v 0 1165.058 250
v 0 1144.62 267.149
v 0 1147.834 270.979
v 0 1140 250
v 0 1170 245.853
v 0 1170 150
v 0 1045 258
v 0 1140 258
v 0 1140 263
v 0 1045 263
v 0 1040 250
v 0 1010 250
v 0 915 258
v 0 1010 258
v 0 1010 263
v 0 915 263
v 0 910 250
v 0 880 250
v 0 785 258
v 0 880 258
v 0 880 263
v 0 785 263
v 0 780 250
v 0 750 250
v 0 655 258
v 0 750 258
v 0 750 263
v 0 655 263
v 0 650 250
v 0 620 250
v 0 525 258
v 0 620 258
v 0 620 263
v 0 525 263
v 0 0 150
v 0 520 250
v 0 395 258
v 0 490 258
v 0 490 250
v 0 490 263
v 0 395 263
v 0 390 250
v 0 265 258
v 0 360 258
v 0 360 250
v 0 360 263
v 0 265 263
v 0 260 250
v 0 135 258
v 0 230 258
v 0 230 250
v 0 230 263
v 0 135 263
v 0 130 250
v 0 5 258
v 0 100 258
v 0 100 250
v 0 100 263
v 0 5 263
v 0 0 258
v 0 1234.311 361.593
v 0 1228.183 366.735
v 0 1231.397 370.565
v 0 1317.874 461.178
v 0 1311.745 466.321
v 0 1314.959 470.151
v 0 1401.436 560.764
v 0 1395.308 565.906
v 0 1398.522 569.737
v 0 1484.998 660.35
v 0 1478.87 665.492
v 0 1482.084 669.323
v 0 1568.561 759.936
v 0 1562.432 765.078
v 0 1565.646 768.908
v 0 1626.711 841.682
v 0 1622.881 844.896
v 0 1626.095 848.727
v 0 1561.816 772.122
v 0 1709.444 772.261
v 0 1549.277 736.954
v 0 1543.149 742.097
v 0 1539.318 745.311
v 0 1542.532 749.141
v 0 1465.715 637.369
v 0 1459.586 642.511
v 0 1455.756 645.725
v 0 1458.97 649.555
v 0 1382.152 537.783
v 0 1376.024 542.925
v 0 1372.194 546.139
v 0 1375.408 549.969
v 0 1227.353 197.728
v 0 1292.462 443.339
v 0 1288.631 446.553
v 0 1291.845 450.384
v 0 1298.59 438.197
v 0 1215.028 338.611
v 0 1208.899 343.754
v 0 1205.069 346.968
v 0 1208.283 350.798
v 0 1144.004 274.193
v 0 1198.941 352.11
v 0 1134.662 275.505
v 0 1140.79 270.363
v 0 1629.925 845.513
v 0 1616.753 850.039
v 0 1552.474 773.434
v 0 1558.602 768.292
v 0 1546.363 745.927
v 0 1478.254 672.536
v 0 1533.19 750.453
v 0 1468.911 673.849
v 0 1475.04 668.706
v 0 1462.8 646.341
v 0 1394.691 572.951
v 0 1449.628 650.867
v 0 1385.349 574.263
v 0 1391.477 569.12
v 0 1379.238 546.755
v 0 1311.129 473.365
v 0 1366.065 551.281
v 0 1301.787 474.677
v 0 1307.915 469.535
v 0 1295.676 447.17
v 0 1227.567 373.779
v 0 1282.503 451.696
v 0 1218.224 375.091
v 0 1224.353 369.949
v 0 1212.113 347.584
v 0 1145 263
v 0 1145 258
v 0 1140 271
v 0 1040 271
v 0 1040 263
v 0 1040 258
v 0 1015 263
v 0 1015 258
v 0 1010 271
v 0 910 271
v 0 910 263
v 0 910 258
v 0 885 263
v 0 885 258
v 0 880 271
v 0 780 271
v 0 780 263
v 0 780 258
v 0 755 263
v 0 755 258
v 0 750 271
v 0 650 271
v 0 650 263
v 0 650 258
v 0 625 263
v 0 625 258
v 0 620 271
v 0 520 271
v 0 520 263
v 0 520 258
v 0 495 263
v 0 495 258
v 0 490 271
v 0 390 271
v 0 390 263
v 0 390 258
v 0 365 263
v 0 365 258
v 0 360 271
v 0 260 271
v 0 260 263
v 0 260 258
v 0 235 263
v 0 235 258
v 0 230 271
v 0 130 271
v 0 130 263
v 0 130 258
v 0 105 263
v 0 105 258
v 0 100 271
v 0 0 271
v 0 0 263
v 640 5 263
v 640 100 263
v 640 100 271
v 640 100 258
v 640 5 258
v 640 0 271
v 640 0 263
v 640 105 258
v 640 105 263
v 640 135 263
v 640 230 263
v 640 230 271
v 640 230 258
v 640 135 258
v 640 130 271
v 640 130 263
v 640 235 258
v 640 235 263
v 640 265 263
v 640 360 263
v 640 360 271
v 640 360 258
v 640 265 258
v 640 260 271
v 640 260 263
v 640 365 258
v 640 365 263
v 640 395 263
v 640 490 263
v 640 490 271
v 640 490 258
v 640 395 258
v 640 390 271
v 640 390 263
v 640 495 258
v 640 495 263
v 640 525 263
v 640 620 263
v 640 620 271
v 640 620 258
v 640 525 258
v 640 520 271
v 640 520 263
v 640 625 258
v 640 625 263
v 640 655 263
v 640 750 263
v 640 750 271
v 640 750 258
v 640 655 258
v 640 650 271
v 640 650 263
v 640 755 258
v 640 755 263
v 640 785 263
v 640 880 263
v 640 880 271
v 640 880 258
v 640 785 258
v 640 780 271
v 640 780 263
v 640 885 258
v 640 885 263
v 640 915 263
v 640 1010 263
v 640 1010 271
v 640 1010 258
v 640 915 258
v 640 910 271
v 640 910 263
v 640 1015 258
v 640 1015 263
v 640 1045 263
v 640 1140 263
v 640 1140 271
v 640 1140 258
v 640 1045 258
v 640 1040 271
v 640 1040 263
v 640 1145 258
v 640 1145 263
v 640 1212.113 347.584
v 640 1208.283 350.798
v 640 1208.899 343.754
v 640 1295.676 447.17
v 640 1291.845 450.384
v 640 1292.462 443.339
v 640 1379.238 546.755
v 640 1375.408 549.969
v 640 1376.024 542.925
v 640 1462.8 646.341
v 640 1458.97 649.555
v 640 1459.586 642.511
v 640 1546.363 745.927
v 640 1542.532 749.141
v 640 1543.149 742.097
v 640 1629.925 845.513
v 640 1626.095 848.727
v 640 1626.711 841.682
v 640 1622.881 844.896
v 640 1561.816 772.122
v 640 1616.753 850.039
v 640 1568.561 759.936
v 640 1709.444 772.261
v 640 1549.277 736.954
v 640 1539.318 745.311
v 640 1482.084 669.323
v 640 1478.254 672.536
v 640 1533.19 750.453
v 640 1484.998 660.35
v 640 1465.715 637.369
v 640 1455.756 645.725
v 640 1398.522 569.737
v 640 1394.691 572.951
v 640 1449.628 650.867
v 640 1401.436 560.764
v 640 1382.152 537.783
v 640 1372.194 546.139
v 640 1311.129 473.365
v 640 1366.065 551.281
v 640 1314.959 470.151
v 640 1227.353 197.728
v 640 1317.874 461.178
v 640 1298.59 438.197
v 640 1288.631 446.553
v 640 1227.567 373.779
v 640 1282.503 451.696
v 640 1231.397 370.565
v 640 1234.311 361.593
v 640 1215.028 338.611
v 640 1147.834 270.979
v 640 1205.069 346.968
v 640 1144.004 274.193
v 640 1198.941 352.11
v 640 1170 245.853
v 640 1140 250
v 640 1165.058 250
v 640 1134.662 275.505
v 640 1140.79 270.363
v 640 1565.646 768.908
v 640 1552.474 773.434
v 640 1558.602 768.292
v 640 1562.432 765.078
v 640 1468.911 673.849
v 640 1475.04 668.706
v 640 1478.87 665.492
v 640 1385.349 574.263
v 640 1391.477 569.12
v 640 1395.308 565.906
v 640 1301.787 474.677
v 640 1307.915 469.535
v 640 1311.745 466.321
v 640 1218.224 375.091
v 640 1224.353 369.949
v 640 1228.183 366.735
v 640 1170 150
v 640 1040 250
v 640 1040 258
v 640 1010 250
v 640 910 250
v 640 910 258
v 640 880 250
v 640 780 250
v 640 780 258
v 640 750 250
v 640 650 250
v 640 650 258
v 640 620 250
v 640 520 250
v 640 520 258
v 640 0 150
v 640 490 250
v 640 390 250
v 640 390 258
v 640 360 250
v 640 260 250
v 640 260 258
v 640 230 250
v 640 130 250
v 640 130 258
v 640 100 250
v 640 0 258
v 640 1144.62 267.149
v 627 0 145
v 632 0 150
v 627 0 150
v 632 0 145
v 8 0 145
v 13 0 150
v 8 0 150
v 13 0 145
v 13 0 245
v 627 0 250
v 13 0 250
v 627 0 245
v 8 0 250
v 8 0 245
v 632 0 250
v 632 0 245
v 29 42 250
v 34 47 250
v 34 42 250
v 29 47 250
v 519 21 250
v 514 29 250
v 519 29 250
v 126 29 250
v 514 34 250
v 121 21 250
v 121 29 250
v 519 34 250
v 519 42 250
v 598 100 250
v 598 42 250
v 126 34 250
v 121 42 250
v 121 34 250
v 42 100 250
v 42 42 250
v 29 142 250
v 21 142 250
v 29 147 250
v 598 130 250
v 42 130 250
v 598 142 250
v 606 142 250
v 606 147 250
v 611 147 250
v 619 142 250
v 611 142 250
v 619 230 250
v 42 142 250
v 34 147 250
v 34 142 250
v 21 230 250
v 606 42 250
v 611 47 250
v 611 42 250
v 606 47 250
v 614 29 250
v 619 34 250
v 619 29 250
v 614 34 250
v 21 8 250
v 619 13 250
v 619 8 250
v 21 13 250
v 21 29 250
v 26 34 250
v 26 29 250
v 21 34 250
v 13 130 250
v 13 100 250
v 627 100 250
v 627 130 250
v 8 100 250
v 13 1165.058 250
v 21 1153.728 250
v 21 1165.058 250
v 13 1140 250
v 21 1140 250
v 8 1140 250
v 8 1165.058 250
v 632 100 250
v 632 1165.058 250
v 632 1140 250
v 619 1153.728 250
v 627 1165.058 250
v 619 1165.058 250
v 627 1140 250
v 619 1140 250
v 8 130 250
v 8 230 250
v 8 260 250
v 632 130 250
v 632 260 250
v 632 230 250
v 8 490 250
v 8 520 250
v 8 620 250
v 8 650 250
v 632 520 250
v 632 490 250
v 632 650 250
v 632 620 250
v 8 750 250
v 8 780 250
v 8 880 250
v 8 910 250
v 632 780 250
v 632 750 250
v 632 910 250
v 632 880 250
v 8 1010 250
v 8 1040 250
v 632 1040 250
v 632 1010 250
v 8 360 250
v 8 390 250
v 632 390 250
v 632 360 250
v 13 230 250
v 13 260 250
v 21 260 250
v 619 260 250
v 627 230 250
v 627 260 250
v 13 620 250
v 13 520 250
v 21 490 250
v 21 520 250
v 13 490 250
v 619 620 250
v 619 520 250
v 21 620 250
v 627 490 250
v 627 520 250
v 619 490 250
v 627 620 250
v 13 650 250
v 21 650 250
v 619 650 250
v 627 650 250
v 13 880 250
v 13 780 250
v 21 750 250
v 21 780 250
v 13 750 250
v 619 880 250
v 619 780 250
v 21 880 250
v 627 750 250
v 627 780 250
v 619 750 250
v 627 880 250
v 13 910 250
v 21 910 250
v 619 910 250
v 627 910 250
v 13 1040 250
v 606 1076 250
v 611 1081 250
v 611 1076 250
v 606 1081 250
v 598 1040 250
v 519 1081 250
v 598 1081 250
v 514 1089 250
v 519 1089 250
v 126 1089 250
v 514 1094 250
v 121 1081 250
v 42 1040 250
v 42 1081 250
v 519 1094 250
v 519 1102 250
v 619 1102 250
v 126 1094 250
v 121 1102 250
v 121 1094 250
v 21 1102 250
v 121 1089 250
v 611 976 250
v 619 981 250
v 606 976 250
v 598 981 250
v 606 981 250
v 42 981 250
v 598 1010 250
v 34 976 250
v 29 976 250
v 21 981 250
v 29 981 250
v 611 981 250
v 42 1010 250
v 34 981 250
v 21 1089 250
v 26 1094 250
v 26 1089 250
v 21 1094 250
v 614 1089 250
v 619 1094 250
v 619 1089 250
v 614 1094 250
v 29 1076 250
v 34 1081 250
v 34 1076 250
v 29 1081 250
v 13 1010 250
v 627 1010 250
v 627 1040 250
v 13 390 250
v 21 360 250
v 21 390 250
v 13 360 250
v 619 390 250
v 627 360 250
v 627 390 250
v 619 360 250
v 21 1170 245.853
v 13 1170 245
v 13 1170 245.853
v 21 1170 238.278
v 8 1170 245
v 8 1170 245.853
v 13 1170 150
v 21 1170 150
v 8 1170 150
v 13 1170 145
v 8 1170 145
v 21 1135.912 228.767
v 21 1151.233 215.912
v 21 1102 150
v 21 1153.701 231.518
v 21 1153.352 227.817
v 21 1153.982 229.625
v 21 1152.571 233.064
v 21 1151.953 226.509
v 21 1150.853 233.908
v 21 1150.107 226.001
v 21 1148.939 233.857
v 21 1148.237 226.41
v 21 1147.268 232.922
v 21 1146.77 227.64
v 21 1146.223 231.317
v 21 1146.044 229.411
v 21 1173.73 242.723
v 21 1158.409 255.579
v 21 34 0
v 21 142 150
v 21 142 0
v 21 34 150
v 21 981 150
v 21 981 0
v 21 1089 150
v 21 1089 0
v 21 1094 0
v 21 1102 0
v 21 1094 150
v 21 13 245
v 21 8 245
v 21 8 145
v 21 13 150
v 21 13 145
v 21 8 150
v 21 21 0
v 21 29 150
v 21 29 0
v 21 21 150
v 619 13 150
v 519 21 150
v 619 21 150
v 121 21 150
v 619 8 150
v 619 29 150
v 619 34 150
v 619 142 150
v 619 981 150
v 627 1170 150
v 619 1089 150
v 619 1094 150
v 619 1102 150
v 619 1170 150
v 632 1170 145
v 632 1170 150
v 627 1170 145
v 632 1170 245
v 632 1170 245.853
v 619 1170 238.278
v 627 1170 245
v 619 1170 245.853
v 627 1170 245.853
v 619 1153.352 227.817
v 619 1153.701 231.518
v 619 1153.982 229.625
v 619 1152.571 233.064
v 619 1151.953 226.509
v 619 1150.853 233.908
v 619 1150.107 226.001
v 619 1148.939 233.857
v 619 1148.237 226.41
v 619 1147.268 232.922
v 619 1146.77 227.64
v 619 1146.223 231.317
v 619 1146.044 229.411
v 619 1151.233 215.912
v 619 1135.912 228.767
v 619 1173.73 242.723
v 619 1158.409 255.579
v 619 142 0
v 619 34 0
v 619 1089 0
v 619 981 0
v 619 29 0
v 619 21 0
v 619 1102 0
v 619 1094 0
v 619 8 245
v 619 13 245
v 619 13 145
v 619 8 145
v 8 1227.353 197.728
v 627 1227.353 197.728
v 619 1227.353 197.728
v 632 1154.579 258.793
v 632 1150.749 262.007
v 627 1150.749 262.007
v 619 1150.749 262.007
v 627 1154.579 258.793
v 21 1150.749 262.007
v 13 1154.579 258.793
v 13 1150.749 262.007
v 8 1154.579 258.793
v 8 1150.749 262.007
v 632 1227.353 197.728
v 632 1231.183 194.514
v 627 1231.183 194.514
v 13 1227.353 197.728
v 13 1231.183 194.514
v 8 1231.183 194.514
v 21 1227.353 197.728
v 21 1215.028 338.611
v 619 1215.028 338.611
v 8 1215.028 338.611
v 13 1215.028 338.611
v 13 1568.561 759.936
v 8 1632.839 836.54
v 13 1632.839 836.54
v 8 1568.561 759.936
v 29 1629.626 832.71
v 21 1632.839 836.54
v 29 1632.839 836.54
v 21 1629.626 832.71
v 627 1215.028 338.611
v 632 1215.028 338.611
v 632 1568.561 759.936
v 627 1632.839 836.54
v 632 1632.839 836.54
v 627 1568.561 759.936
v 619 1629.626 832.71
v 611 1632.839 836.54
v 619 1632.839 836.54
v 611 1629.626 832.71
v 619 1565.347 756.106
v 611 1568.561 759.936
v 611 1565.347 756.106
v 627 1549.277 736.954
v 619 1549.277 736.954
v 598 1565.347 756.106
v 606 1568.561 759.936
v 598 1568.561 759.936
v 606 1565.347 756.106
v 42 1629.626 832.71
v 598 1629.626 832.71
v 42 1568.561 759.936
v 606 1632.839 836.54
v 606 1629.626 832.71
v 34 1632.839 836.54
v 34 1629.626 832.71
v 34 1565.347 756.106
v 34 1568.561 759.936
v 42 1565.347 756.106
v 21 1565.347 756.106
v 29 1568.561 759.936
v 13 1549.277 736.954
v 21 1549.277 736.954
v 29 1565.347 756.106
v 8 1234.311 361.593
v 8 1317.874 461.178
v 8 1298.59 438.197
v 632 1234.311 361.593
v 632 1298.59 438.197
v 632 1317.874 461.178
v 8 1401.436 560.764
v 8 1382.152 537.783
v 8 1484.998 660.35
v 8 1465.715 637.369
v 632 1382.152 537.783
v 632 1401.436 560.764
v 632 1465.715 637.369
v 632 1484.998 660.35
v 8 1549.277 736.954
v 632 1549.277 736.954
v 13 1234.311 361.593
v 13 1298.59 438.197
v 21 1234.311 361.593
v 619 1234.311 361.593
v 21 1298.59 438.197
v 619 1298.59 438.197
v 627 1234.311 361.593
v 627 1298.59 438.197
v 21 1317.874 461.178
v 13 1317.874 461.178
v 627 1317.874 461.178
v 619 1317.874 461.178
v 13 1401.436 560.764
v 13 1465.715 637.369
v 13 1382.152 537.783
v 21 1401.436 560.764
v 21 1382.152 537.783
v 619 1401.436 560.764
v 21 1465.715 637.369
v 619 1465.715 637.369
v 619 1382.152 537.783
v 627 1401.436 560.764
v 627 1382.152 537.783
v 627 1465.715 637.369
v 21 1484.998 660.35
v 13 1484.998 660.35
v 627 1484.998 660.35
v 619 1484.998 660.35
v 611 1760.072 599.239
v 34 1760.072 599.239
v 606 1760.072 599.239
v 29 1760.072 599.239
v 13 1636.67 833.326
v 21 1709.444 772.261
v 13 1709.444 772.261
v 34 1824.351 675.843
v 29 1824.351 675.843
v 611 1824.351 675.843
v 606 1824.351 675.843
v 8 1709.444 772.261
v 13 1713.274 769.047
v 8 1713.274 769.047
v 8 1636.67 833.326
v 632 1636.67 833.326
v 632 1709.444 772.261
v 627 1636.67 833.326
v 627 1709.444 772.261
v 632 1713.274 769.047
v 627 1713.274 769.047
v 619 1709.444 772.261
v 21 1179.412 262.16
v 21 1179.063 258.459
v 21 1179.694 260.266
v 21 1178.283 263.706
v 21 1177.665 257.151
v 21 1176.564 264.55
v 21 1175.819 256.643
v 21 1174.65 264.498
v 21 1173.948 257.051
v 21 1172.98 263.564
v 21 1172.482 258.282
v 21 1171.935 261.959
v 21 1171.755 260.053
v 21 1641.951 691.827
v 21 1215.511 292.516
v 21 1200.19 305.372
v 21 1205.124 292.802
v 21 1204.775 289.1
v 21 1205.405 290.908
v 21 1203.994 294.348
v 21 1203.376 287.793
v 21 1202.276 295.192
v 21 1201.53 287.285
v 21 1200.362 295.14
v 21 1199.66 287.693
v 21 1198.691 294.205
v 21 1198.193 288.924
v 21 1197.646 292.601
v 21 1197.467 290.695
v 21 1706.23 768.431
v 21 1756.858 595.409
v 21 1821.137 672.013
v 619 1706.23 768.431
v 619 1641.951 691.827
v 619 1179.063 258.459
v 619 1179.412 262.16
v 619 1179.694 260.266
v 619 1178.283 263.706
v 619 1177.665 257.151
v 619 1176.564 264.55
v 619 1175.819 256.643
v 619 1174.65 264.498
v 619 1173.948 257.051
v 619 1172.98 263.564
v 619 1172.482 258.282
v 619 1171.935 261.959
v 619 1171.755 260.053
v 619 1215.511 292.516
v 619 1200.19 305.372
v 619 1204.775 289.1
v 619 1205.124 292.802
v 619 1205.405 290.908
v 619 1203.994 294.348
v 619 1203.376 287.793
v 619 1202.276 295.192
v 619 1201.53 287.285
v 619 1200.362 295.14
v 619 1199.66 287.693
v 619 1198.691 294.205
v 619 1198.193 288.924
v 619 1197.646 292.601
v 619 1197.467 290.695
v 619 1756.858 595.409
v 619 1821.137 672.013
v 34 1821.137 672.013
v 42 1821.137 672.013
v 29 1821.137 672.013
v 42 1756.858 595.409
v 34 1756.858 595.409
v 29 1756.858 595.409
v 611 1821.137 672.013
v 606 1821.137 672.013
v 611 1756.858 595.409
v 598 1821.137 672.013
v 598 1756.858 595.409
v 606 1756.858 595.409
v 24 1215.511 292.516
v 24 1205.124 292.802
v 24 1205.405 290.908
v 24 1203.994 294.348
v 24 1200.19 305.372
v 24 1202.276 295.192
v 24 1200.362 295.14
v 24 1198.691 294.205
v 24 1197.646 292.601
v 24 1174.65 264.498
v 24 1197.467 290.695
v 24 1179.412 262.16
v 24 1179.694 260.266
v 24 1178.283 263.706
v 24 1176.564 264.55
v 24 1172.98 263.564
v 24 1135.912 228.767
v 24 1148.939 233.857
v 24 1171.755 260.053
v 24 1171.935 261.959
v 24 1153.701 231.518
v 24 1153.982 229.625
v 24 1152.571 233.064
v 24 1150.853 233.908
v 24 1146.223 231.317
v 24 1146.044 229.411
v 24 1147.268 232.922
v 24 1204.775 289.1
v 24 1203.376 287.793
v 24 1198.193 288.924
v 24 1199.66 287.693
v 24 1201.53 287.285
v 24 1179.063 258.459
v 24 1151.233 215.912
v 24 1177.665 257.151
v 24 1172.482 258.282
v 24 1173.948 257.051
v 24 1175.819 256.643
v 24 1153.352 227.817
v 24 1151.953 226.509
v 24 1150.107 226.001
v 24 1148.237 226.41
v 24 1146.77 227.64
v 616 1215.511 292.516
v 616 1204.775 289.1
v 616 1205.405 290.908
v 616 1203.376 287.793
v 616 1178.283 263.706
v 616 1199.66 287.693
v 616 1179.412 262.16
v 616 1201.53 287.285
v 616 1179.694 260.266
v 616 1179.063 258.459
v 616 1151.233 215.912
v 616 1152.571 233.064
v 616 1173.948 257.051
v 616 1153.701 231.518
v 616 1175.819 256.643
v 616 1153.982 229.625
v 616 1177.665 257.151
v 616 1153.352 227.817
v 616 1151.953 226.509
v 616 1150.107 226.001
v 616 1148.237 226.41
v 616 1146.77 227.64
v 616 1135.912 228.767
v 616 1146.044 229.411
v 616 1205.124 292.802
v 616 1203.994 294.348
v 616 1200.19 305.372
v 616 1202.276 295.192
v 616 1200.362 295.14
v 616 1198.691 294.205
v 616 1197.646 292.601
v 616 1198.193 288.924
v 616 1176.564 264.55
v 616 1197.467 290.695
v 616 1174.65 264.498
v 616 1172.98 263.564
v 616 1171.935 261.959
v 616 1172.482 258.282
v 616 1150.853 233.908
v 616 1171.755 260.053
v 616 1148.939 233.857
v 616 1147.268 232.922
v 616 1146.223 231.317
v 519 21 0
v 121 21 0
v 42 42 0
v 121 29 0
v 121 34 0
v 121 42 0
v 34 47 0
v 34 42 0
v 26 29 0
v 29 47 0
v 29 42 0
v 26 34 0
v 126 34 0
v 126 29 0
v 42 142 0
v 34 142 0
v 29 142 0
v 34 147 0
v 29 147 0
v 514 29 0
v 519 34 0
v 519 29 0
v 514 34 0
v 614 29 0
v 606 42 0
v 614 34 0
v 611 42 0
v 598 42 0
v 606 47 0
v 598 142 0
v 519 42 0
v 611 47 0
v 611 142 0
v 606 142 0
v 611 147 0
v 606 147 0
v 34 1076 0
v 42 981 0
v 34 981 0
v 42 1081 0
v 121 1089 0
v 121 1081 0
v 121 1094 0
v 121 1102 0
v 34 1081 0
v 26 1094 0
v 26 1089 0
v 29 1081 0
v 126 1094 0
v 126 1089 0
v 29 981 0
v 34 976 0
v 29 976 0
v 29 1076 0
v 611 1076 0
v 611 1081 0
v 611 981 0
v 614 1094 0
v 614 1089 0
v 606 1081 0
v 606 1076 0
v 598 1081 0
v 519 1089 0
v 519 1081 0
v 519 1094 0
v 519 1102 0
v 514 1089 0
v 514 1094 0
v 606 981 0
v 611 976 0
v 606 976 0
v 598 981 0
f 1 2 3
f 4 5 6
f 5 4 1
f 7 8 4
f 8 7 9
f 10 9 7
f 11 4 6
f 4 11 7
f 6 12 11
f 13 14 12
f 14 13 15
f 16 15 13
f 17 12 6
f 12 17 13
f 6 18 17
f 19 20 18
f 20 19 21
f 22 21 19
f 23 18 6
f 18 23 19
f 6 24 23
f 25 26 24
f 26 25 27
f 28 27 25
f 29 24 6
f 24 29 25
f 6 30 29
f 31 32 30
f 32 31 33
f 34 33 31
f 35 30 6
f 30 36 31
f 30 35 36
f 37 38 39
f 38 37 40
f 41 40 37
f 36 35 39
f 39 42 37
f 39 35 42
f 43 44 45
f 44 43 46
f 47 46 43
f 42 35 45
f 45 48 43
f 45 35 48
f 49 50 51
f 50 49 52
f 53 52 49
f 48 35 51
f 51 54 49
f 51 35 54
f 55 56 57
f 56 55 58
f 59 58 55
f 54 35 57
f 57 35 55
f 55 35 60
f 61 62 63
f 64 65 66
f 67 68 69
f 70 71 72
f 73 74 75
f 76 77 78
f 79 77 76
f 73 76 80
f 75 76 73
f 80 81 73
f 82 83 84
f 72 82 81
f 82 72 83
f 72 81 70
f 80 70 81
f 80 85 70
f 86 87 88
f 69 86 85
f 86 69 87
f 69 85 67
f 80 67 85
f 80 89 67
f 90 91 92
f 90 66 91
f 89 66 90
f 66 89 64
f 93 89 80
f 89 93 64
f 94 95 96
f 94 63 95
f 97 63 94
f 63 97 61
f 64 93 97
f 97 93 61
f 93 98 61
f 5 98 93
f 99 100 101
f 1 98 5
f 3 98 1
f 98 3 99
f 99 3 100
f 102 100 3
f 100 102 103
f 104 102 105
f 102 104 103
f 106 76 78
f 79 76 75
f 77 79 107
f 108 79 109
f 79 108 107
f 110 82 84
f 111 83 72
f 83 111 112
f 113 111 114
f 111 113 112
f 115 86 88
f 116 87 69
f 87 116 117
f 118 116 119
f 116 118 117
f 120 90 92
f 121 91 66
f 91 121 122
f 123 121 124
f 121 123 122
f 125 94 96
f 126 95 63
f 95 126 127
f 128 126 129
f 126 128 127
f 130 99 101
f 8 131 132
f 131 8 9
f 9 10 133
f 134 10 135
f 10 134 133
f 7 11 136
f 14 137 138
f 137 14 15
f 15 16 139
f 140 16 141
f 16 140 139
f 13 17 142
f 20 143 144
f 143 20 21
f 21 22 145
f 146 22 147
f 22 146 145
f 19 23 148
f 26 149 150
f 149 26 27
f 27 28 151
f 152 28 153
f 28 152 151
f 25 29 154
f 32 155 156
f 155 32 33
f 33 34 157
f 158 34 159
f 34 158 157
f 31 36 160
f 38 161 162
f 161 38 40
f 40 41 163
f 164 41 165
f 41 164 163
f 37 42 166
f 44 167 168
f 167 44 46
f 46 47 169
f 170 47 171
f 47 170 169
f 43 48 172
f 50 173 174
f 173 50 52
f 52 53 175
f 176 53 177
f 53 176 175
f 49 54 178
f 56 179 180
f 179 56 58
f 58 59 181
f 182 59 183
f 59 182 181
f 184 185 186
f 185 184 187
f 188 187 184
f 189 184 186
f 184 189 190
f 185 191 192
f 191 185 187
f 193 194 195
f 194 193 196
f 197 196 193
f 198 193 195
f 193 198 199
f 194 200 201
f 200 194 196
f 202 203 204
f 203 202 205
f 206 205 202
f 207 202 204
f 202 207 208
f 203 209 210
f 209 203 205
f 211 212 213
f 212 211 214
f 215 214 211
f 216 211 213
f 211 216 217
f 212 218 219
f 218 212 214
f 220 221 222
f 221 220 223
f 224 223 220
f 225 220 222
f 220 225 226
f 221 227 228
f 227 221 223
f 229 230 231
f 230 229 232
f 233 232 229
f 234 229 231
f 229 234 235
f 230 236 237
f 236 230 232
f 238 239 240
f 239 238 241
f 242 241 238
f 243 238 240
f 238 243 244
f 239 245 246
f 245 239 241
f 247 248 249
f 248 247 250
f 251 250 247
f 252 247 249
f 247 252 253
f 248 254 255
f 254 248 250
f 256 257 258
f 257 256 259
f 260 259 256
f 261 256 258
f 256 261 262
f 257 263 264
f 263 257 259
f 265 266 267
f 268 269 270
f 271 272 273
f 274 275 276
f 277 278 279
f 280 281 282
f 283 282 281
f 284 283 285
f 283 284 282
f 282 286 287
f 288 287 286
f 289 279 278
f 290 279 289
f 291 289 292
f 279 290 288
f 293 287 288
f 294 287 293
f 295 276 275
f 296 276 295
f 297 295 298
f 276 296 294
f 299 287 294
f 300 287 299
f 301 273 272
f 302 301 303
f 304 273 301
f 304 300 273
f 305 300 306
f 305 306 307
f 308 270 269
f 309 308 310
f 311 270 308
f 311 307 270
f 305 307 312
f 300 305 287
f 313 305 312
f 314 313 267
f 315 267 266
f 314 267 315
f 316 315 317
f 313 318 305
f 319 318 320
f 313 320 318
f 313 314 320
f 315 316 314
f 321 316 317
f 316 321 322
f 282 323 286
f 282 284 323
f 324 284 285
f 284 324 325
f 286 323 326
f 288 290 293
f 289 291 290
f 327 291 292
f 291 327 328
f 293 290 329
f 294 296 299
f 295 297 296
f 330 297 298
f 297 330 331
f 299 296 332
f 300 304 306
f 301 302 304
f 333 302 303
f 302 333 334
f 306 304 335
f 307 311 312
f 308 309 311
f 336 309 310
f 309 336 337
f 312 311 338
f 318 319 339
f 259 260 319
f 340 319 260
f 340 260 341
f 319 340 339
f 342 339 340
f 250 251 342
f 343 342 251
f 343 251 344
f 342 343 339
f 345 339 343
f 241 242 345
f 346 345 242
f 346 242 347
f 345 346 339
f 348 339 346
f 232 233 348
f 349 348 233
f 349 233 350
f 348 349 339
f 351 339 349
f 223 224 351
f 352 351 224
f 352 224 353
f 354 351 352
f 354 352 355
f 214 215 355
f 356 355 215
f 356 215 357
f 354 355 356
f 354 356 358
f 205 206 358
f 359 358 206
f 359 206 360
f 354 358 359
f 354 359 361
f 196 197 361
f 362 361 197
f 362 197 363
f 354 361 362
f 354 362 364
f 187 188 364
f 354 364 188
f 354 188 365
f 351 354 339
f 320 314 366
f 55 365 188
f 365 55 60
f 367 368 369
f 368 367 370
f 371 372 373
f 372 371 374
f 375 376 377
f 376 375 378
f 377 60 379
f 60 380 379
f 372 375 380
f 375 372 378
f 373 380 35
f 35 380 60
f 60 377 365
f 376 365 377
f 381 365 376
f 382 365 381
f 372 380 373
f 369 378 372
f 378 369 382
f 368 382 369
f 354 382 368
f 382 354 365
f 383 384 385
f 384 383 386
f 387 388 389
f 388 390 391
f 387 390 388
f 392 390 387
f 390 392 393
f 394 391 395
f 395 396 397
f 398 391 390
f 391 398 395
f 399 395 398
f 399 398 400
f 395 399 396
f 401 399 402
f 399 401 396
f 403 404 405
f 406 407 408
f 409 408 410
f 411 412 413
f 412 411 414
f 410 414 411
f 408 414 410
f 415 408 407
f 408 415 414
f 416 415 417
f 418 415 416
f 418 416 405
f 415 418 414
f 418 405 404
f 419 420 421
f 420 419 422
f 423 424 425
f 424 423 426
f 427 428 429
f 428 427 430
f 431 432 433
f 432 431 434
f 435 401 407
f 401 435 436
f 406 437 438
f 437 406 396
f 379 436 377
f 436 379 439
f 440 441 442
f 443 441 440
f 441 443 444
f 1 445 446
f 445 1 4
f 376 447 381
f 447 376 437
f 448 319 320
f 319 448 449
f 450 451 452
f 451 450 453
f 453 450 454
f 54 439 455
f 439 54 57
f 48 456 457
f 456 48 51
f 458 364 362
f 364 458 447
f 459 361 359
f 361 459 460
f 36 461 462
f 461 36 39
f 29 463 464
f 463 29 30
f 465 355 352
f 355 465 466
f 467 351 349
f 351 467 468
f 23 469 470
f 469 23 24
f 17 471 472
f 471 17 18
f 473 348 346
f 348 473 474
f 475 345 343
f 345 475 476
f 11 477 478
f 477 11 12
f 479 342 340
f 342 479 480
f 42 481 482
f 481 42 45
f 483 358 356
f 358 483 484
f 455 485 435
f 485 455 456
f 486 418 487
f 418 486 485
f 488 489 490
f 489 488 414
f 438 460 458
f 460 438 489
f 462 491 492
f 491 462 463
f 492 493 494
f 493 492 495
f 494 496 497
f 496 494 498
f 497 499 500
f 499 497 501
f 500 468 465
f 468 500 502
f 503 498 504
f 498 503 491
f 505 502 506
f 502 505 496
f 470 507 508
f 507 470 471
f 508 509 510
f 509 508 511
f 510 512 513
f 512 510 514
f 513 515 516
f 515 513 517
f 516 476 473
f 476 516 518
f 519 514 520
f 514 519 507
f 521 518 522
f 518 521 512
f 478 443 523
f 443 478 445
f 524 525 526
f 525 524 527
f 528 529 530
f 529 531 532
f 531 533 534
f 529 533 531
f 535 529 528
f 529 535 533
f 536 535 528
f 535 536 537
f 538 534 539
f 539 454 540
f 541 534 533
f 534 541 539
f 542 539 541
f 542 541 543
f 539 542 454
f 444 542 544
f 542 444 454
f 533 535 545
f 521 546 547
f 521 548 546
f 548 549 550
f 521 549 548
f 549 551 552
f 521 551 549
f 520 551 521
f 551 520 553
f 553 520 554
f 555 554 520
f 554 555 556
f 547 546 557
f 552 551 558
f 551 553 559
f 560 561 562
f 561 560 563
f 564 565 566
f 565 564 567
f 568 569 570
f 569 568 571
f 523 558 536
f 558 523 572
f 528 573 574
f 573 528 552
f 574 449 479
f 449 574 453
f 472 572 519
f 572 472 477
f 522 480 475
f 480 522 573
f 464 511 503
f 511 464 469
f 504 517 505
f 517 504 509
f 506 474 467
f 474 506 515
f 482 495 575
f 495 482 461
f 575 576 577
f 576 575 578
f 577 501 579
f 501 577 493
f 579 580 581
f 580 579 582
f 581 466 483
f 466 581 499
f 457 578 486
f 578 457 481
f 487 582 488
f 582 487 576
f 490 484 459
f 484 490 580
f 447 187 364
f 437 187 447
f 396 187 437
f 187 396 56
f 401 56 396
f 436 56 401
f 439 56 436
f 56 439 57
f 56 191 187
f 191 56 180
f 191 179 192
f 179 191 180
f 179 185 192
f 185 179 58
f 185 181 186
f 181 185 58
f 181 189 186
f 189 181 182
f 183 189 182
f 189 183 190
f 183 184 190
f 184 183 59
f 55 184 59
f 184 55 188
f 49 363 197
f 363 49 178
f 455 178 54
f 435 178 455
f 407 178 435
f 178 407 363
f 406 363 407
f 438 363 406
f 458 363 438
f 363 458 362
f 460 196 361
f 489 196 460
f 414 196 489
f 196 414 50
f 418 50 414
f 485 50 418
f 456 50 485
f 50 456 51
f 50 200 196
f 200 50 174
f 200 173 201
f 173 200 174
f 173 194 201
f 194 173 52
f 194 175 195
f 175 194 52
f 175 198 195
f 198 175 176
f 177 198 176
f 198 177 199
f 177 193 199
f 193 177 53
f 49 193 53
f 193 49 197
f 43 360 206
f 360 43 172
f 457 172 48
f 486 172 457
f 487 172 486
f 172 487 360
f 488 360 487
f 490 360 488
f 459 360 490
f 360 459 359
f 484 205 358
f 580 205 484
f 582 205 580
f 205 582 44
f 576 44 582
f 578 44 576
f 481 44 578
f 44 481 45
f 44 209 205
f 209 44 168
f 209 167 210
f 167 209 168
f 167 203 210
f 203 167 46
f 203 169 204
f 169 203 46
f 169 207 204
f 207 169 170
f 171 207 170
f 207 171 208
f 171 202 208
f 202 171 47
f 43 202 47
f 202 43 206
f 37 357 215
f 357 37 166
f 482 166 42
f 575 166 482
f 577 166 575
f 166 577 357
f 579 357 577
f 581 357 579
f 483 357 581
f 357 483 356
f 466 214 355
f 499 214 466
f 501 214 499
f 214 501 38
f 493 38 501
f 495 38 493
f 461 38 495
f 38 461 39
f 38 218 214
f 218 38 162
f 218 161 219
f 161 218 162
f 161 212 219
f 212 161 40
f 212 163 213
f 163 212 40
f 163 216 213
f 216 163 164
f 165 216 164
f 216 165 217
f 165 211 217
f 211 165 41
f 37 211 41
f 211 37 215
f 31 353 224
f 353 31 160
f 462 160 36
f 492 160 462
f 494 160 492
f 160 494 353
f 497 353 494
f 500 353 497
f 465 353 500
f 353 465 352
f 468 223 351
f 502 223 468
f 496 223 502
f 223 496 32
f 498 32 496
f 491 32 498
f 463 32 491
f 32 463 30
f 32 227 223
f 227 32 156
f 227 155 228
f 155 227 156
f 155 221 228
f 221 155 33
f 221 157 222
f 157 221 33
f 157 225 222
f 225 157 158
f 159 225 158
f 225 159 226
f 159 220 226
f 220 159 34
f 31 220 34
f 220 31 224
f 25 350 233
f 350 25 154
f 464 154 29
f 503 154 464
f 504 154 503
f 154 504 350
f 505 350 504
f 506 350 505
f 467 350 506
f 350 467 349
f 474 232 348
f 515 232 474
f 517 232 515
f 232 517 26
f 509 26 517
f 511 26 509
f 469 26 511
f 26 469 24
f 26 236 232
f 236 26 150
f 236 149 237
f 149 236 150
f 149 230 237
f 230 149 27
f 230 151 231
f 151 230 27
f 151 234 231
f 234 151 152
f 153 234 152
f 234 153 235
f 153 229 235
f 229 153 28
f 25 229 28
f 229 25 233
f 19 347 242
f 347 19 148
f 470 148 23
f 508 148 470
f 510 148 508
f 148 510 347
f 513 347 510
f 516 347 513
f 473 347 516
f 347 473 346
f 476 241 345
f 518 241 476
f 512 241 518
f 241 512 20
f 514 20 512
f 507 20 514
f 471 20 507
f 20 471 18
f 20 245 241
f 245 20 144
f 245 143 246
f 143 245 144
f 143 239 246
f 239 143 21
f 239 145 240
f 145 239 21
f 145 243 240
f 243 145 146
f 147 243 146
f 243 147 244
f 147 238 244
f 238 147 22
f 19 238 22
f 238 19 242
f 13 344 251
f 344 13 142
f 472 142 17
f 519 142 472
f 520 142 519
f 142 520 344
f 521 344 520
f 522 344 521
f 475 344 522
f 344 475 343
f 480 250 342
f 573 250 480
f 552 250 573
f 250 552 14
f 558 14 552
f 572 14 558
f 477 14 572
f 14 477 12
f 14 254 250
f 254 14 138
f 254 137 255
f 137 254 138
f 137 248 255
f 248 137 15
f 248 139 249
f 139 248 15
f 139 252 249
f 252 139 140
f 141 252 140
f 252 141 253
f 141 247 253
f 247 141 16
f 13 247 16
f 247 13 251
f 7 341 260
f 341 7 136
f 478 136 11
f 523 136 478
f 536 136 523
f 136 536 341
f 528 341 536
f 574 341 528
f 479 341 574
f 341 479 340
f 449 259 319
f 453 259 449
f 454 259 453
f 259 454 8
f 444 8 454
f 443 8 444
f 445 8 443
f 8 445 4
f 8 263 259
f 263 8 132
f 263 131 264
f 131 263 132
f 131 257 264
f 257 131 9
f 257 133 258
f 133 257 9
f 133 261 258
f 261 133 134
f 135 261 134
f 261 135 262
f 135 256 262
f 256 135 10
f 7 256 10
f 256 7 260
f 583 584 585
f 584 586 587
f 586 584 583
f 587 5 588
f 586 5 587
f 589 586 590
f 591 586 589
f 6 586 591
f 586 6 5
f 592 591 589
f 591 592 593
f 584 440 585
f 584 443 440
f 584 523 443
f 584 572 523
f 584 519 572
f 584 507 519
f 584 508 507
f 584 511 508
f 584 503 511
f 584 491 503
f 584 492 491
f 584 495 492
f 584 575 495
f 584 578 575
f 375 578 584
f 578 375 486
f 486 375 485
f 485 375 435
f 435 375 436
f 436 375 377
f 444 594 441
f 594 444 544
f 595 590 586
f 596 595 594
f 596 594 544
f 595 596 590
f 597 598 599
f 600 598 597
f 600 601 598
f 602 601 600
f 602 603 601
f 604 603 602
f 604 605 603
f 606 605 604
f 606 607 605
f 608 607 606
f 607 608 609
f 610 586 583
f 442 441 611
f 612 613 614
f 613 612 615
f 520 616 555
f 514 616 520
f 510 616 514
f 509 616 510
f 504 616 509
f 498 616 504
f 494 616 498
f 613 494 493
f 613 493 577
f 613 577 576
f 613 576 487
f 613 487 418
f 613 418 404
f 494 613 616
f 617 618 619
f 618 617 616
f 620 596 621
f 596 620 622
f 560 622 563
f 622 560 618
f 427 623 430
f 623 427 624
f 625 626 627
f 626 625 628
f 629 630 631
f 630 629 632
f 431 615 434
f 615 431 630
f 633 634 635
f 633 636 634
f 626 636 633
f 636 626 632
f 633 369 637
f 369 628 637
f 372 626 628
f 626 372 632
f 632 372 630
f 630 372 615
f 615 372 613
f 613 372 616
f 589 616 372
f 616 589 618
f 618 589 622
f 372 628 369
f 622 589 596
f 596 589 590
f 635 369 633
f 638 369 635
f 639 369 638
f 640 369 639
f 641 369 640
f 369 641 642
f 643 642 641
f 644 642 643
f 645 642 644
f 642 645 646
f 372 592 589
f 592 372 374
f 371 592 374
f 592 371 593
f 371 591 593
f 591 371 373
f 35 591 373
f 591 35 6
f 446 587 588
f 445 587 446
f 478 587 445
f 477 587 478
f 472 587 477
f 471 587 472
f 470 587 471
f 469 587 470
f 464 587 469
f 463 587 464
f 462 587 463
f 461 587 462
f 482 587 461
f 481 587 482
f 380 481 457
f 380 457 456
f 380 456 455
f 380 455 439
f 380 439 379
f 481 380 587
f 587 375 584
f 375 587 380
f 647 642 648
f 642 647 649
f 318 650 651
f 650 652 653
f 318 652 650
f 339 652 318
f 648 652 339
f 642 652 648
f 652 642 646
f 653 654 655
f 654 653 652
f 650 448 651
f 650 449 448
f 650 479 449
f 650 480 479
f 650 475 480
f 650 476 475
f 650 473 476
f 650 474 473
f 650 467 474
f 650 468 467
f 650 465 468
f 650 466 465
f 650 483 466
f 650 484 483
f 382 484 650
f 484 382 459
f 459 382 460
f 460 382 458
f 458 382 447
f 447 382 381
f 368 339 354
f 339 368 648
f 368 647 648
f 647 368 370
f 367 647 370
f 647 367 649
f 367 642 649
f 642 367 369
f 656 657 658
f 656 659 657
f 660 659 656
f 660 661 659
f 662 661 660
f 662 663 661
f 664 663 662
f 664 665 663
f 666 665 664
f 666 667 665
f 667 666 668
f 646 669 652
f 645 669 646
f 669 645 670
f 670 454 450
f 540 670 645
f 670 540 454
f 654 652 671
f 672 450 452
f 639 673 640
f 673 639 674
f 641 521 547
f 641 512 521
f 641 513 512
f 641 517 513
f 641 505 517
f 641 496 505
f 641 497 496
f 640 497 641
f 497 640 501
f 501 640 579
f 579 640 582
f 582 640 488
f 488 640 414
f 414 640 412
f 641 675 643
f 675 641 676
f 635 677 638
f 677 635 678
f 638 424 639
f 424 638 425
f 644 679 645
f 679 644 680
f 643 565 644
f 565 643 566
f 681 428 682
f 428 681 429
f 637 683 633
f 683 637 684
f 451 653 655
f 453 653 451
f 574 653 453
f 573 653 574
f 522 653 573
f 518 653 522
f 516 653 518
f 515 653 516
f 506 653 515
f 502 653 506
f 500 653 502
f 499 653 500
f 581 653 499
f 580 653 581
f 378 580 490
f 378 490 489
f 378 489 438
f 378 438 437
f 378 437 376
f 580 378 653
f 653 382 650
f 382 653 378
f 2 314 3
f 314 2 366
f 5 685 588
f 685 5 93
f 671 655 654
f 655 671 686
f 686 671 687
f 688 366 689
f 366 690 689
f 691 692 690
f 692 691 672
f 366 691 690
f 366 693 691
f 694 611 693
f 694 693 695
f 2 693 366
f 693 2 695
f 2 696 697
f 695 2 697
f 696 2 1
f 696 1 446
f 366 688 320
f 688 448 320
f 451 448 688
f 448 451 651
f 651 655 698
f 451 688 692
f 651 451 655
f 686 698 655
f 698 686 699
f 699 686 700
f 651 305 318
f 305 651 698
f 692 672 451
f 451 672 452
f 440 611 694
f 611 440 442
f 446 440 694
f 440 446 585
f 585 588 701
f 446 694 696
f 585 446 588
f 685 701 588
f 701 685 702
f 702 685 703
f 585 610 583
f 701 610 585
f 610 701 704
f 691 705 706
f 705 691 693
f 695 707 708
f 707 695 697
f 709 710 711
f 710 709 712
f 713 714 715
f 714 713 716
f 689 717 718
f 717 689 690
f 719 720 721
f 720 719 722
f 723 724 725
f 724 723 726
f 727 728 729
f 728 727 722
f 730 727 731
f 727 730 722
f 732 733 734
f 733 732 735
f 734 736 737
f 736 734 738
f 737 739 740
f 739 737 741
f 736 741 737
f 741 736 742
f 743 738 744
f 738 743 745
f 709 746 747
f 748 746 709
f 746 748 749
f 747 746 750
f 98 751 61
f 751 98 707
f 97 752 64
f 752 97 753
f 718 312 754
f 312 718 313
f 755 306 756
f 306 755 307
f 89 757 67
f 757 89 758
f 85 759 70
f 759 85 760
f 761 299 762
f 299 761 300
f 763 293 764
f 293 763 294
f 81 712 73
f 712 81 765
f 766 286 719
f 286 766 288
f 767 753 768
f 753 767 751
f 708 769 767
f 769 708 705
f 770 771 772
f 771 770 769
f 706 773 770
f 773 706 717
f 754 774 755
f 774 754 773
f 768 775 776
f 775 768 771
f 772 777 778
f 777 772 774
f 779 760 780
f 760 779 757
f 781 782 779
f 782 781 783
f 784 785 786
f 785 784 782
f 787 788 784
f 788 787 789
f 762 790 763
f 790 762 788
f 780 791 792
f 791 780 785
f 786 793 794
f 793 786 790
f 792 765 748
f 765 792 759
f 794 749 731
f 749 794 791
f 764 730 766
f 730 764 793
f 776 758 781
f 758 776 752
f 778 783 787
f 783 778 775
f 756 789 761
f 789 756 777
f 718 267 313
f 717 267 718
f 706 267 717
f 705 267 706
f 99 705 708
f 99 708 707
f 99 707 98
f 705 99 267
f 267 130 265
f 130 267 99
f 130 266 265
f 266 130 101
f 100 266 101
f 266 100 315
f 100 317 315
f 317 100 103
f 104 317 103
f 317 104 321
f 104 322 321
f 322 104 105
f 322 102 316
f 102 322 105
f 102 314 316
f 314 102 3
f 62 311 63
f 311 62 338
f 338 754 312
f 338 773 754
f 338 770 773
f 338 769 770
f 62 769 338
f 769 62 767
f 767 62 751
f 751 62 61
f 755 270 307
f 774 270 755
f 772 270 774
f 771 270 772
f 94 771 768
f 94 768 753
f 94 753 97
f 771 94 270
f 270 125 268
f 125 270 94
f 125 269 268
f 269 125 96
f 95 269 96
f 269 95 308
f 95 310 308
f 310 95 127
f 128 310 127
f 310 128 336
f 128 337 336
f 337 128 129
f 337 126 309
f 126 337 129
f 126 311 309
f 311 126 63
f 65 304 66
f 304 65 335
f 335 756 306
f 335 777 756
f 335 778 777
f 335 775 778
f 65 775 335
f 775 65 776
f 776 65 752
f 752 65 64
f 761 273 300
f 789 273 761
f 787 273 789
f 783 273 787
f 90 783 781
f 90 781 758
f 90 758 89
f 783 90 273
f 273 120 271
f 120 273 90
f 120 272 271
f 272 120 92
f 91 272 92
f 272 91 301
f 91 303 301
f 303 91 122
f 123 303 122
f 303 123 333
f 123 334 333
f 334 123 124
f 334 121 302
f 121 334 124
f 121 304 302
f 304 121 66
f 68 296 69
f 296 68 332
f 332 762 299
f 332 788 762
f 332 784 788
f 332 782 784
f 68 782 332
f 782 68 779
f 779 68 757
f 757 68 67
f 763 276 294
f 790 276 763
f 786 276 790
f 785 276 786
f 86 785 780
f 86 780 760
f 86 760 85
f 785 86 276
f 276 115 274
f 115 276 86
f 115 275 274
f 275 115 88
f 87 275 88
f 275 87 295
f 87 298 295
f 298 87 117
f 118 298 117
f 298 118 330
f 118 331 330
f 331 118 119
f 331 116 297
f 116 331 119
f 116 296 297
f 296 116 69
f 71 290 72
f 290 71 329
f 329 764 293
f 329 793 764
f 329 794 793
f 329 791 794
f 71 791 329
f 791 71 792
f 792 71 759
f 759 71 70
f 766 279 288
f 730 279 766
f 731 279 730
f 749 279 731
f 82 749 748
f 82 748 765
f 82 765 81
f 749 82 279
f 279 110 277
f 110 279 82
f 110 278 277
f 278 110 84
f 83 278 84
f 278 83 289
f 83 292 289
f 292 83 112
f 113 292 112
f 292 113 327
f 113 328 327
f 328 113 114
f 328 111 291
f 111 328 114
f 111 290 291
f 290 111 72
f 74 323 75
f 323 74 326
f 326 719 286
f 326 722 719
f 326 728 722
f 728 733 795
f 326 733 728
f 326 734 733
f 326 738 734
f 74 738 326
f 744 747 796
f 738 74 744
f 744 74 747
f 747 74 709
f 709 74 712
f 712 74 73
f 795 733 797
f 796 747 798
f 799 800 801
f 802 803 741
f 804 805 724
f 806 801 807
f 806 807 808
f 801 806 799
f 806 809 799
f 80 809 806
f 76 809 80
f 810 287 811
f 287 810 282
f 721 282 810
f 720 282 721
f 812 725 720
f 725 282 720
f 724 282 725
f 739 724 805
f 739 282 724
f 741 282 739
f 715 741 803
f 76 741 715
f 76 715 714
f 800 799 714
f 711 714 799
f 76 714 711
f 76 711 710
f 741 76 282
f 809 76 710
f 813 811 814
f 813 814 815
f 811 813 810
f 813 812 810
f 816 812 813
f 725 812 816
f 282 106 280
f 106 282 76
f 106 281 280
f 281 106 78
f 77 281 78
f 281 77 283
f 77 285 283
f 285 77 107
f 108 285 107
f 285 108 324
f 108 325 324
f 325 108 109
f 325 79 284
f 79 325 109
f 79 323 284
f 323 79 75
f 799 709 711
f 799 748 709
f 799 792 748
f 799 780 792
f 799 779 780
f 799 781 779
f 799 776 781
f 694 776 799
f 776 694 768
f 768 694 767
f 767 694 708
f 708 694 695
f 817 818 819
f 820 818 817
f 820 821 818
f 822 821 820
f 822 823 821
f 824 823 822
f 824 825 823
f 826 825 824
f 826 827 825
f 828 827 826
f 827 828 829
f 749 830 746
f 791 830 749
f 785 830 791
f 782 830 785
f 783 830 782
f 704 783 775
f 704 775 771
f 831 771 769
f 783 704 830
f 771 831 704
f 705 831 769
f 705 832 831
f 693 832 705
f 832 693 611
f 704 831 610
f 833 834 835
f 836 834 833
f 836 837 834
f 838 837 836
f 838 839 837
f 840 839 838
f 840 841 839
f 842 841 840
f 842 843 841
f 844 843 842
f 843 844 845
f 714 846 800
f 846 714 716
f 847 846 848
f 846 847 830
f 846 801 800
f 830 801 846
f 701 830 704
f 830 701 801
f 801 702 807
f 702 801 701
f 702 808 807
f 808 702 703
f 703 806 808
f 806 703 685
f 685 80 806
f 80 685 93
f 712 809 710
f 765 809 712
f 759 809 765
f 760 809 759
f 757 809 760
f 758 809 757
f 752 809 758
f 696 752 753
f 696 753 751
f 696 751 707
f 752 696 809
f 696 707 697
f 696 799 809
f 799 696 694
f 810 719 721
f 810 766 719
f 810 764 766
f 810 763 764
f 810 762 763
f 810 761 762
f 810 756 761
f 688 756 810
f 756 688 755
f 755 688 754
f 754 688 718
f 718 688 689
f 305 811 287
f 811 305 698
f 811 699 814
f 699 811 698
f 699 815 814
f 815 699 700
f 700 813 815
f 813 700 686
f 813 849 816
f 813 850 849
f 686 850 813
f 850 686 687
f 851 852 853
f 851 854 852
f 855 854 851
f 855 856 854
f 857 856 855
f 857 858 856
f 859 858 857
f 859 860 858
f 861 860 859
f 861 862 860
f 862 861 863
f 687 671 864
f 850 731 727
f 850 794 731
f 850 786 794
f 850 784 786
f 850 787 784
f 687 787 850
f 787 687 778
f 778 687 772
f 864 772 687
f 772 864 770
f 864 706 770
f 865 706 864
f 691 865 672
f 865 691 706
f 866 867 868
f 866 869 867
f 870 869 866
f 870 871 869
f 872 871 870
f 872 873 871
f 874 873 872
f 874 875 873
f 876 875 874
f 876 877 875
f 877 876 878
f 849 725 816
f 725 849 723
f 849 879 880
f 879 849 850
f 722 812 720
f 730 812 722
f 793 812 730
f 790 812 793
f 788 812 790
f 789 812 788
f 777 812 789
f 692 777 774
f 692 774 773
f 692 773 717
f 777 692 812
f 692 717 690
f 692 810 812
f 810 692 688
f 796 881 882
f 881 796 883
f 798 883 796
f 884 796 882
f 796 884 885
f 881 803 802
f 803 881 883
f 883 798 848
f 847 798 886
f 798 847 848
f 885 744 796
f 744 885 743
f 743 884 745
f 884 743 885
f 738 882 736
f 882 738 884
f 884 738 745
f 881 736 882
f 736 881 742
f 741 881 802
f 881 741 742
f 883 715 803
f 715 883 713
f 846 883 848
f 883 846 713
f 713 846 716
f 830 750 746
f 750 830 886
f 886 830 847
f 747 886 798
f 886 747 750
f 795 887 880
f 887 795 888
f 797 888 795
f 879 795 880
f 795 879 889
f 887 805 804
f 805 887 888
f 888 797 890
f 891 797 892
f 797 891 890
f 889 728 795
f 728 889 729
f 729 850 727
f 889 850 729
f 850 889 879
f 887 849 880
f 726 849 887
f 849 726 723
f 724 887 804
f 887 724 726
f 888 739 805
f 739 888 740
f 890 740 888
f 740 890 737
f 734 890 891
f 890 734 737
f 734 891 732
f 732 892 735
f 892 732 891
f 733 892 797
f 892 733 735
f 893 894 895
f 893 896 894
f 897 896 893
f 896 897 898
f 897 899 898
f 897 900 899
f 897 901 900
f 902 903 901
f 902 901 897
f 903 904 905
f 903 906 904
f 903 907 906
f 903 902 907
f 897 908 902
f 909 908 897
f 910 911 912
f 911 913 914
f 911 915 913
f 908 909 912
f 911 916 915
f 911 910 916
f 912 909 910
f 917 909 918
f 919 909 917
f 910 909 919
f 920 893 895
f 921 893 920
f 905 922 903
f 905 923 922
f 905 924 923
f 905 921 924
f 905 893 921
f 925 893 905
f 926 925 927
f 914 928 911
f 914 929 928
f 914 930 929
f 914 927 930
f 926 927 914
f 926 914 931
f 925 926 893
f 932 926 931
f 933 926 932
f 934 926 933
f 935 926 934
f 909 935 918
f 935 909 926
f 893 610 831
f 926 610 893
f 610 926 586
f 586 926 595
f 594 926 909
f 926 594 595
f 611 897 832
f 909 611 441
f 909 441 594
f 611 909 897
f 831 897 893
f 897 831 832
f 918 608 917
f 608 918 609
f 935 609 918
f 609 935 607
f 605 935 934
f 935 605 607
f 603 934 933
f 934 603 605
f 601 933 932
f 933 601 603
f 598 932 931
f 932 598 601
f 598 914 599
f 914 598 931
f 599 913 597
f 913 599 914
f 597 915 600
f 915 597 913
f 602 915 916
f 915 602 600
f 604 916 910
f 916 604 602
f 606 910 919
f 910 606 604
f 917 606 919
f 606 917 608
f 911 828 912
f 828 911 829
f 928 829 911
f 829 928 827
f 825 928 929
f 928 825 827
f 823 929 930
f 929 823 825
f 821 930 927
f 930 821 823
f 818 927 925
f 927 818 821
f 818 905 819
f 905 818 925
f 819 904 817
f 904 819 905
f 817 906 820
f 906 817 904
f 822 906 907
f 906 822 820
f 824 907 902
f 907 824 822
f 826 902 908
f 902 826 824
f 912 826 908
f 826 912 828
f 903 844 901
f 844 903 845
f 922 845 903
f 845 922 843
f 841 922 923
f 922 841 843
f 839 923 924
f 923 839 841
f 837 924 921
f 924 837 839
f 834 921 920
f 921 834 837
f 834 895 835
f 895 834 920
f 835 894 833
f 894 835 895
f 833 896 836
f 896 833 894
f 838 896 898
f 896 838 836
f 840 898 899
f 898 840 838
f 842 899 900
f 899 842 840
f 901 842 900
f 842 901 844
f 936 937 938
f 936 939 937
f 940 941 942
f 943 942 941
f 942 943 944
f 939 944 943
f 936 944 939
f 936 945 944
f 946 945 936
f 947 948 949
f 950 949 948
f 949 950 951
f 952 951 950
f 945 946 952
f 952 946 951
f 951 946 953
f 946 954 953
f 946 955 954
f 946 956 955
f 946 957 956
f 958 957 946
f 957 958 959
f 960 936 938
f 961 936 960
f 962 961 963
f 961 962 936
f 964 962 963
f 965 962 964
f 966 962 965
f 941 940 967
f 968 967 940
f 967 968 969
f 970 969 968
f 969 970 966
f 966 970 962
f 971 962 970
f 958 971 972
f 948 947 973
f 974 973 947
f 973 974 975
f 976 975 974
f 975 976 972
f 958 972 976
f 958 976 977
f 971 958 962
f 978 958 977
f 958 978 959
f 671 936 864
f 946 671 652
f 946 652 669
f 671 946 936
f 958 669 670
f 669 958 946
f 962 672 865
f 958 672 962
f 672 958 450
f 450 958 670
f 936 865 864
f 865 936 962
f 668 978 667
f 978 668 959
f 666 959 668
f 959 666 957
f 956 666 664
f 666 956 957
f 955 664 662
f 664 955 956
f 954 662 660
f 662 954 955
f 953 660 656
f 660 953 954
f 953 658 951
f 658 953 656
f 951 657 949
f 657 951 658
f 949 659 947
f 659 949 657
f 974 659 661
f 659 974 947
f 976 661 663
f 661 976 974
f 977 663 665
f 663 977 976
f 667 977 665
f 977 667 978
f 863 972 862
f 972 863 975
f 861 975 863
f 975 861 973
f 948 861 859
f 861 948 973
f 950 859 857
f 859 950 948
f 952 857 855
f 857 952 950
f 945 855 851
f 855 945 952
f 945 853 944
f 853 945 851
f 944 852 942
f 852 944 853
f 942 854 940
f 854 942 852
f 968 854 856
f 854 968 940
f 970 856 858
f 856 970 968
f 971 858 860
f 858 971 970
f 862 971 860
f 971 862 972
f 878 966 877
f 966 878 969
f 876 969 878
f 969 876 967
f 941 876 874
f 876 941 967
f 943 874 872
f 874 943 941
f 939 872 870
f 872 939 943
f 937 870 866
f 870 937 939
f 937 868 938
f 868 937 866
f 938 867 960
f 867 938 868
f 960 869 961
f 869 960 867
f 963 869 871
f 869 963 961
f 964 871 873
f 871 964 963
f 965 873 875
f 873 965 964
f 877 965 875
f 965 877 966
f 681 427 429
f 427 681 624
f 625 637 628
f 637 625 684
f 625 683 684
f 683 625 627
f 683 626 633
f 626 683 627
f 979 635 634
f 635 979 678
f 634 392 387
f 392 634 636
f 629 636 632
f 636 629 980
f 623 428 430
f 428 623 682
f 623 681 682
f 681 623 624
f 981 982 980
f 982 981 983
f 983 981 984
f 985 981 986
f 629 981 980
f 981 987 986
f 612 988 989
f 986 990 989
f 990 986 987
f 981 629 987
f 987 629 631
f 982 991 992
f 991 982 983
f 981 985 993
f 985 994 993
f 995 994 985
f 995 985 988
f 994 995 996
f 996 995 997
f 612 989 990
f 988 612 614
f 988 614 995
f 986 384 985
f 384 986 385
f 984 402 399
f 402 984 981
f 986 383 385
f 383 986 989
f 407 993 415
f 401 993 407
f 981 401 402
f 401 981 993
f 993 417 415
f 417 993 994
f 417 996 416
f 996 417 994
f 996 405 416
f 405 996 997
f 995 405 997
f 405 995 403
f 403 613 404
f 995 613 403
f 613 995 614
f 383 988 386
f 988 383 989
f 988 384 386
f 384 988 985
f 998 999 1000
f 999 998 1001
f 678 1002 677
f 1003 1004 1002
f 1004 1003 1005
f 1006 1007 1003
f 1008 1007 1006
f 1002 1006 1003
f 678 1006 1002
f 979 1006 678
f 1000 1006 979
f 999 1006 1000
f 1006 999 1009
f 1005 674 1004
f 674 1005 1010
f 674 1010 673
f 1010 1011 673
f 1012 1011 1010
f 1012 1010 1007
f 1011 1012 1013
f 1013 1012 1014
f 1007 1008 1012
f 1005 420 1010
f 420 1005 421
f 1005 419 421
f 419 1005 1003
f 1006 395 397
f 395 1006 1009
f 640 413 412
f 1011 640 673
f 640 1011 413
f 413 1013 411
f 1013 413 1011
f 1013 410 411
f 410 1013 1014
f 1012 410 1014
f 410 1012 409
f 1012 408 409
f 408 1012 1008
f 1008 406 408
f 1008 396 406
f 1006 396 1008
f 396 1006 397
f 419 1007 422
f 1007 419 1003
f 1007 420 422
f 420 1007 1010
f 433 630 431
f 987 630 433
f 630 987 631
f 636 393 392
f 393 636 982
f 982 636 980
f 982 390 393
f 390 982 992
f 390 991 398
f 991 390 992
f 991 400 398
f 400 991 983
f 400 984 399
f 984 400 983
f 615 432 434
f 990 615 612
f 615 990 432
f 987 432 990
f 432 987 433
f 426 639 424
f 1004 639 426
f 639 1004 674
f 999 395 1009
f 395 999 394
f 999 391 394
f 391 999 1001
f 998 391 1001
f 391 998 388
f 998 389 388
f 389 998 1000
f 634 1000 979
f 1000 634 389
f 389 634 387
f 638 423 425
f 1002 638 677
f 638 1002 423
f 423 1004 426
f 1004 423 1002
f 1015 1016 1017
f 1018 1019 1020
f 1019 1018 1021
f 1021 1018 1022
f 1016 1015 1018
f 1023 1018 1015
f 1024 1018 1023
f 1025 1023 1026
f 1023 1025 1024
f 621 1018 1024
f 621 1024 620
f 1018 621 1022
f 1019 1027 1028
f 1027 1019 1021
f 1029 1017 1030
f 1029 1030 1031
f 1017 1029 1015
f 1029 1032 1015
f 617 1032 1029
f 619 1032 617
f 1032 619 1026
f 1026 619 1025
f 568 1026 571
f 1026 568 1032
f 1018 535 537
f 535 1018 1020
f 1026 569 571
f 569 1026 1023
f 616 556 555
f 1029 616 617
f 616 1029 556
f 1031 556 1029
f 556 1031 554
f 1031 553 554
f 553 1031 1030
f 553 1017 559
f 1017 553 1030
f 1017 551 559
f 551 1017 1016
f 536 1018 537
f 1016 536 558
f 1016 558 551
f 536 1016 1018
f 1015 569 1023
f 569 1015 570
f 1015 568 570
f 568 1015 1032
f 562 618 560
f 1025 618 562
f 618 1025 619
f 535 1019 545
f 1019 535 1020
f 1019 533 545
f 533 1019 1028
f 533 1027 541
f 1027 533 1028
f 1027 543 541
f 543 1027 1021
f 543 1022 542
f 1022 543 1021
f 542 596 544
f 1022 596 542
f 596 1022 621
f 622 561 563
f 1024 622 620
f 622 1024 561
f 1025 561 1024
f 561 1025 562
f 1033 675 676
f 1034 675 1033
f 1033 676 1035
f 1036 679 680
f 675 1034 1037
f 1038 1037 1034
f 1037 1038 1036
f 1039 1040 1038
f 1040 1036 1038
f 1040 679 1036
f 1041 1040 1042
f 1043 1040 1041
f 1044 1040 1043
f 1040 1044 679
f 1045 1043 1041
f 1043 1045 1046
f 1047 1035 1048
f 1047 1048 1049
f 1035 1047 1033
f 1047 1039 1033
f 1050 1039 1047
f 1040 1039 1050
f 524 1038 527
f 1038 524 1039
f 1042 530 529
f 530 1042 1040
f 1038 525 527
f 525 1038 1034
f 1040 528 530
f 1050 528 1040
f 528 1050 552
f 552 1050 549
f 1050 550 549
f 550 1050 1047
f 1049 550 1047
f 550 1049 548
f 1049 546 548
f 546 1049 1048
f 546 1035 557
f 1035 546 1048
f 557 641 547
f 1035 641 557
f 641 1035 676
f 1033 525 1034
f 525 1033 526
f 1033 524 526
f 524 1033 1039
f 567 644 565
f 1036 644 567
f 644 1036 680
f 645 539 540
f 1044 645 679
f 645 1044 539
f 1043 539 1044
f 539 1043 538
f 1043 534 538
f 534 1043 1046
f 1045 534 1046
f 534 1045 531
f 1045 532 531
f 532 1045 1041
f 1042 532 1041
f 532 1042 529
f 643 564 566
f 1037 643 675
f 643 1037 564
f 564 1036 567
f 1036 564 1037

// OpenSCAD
module regle(){
    color([.4,.4,.6])
    linear_extrude(3)
    difference(){
        square([100,20]);
        translate([10,10]) circle(d=8);
        translate([50,10]) circle(d=8);
        translate([90,10]) circle(d=8);
        }
   }

module profil(L){
    linear_extrude(L){
    translate([0,0]) square([100,8]);
    translate([5,8]) square([100,5]);
    translate([0,13]) square([100,8]);
    }
    }
translate([0,0,250])    
union(){
translate([0,0,0]) rotate([0,90,90]) translate([0,-21,0]) profil(1170);    
translate([640-21,0,0]) rotate([0,90,90]) translate([0,-21,0]) profil(1170);    

    
for(n=[0:8]){    
translate([0,n*130,0])rotate([90,0,90]) profil(640);
    }
}
translate([21,0,250]) rotate([0,90,0]) profil(640-(21*2));


translate([0,1170-20,250-20]) 
rotate([50,0])
translate([0,25,20])   
union(){
translate([0,0,0]) rotate([0,90,90]) translate([0,-21,0]) profil(750);    
translate([640-21,0,0]) rotate([0,90,90]) translate([0,-21,0]) profil(750);    
for(n=[0:5]){    
translate([0,n*130,0])rotate([90,0,90]) profil(640);
    }
translate([21*2,21*2+603,-250]) rotate([0,0,90]) profil(250); //pied
translate([640-21,21*2+603,-250]) rotate([0,0,90]) profil(250); //pied
translate([21+3,-10-25,-10]) rotate([-90,0,90]) regle();
translate([640-21,-10-25,-10]) rotate([-90,0,90]) regle();
}

translate([21*2,21*2]) rotate([0,0,90]) profil(250);
translate([640-21,21*2]) rotate([0,0,90]) profil(250);

translate([21,21]) rotate([0,0,0]) profil(250);
translate([640-21,21*2]) rotate([0,0,180]) profil(250);

translate([21,21+1060]) rotate([0,0,-90]) profil(250);
translate([21,21+1060]) rotate([0,0,0]) profil(250);

translate([640-21*2,21+1060]) rotate([0,0,-90]) profil(250);
translate([640-21,21*2+1060]) rotate([0,0,180]) profil(250);
